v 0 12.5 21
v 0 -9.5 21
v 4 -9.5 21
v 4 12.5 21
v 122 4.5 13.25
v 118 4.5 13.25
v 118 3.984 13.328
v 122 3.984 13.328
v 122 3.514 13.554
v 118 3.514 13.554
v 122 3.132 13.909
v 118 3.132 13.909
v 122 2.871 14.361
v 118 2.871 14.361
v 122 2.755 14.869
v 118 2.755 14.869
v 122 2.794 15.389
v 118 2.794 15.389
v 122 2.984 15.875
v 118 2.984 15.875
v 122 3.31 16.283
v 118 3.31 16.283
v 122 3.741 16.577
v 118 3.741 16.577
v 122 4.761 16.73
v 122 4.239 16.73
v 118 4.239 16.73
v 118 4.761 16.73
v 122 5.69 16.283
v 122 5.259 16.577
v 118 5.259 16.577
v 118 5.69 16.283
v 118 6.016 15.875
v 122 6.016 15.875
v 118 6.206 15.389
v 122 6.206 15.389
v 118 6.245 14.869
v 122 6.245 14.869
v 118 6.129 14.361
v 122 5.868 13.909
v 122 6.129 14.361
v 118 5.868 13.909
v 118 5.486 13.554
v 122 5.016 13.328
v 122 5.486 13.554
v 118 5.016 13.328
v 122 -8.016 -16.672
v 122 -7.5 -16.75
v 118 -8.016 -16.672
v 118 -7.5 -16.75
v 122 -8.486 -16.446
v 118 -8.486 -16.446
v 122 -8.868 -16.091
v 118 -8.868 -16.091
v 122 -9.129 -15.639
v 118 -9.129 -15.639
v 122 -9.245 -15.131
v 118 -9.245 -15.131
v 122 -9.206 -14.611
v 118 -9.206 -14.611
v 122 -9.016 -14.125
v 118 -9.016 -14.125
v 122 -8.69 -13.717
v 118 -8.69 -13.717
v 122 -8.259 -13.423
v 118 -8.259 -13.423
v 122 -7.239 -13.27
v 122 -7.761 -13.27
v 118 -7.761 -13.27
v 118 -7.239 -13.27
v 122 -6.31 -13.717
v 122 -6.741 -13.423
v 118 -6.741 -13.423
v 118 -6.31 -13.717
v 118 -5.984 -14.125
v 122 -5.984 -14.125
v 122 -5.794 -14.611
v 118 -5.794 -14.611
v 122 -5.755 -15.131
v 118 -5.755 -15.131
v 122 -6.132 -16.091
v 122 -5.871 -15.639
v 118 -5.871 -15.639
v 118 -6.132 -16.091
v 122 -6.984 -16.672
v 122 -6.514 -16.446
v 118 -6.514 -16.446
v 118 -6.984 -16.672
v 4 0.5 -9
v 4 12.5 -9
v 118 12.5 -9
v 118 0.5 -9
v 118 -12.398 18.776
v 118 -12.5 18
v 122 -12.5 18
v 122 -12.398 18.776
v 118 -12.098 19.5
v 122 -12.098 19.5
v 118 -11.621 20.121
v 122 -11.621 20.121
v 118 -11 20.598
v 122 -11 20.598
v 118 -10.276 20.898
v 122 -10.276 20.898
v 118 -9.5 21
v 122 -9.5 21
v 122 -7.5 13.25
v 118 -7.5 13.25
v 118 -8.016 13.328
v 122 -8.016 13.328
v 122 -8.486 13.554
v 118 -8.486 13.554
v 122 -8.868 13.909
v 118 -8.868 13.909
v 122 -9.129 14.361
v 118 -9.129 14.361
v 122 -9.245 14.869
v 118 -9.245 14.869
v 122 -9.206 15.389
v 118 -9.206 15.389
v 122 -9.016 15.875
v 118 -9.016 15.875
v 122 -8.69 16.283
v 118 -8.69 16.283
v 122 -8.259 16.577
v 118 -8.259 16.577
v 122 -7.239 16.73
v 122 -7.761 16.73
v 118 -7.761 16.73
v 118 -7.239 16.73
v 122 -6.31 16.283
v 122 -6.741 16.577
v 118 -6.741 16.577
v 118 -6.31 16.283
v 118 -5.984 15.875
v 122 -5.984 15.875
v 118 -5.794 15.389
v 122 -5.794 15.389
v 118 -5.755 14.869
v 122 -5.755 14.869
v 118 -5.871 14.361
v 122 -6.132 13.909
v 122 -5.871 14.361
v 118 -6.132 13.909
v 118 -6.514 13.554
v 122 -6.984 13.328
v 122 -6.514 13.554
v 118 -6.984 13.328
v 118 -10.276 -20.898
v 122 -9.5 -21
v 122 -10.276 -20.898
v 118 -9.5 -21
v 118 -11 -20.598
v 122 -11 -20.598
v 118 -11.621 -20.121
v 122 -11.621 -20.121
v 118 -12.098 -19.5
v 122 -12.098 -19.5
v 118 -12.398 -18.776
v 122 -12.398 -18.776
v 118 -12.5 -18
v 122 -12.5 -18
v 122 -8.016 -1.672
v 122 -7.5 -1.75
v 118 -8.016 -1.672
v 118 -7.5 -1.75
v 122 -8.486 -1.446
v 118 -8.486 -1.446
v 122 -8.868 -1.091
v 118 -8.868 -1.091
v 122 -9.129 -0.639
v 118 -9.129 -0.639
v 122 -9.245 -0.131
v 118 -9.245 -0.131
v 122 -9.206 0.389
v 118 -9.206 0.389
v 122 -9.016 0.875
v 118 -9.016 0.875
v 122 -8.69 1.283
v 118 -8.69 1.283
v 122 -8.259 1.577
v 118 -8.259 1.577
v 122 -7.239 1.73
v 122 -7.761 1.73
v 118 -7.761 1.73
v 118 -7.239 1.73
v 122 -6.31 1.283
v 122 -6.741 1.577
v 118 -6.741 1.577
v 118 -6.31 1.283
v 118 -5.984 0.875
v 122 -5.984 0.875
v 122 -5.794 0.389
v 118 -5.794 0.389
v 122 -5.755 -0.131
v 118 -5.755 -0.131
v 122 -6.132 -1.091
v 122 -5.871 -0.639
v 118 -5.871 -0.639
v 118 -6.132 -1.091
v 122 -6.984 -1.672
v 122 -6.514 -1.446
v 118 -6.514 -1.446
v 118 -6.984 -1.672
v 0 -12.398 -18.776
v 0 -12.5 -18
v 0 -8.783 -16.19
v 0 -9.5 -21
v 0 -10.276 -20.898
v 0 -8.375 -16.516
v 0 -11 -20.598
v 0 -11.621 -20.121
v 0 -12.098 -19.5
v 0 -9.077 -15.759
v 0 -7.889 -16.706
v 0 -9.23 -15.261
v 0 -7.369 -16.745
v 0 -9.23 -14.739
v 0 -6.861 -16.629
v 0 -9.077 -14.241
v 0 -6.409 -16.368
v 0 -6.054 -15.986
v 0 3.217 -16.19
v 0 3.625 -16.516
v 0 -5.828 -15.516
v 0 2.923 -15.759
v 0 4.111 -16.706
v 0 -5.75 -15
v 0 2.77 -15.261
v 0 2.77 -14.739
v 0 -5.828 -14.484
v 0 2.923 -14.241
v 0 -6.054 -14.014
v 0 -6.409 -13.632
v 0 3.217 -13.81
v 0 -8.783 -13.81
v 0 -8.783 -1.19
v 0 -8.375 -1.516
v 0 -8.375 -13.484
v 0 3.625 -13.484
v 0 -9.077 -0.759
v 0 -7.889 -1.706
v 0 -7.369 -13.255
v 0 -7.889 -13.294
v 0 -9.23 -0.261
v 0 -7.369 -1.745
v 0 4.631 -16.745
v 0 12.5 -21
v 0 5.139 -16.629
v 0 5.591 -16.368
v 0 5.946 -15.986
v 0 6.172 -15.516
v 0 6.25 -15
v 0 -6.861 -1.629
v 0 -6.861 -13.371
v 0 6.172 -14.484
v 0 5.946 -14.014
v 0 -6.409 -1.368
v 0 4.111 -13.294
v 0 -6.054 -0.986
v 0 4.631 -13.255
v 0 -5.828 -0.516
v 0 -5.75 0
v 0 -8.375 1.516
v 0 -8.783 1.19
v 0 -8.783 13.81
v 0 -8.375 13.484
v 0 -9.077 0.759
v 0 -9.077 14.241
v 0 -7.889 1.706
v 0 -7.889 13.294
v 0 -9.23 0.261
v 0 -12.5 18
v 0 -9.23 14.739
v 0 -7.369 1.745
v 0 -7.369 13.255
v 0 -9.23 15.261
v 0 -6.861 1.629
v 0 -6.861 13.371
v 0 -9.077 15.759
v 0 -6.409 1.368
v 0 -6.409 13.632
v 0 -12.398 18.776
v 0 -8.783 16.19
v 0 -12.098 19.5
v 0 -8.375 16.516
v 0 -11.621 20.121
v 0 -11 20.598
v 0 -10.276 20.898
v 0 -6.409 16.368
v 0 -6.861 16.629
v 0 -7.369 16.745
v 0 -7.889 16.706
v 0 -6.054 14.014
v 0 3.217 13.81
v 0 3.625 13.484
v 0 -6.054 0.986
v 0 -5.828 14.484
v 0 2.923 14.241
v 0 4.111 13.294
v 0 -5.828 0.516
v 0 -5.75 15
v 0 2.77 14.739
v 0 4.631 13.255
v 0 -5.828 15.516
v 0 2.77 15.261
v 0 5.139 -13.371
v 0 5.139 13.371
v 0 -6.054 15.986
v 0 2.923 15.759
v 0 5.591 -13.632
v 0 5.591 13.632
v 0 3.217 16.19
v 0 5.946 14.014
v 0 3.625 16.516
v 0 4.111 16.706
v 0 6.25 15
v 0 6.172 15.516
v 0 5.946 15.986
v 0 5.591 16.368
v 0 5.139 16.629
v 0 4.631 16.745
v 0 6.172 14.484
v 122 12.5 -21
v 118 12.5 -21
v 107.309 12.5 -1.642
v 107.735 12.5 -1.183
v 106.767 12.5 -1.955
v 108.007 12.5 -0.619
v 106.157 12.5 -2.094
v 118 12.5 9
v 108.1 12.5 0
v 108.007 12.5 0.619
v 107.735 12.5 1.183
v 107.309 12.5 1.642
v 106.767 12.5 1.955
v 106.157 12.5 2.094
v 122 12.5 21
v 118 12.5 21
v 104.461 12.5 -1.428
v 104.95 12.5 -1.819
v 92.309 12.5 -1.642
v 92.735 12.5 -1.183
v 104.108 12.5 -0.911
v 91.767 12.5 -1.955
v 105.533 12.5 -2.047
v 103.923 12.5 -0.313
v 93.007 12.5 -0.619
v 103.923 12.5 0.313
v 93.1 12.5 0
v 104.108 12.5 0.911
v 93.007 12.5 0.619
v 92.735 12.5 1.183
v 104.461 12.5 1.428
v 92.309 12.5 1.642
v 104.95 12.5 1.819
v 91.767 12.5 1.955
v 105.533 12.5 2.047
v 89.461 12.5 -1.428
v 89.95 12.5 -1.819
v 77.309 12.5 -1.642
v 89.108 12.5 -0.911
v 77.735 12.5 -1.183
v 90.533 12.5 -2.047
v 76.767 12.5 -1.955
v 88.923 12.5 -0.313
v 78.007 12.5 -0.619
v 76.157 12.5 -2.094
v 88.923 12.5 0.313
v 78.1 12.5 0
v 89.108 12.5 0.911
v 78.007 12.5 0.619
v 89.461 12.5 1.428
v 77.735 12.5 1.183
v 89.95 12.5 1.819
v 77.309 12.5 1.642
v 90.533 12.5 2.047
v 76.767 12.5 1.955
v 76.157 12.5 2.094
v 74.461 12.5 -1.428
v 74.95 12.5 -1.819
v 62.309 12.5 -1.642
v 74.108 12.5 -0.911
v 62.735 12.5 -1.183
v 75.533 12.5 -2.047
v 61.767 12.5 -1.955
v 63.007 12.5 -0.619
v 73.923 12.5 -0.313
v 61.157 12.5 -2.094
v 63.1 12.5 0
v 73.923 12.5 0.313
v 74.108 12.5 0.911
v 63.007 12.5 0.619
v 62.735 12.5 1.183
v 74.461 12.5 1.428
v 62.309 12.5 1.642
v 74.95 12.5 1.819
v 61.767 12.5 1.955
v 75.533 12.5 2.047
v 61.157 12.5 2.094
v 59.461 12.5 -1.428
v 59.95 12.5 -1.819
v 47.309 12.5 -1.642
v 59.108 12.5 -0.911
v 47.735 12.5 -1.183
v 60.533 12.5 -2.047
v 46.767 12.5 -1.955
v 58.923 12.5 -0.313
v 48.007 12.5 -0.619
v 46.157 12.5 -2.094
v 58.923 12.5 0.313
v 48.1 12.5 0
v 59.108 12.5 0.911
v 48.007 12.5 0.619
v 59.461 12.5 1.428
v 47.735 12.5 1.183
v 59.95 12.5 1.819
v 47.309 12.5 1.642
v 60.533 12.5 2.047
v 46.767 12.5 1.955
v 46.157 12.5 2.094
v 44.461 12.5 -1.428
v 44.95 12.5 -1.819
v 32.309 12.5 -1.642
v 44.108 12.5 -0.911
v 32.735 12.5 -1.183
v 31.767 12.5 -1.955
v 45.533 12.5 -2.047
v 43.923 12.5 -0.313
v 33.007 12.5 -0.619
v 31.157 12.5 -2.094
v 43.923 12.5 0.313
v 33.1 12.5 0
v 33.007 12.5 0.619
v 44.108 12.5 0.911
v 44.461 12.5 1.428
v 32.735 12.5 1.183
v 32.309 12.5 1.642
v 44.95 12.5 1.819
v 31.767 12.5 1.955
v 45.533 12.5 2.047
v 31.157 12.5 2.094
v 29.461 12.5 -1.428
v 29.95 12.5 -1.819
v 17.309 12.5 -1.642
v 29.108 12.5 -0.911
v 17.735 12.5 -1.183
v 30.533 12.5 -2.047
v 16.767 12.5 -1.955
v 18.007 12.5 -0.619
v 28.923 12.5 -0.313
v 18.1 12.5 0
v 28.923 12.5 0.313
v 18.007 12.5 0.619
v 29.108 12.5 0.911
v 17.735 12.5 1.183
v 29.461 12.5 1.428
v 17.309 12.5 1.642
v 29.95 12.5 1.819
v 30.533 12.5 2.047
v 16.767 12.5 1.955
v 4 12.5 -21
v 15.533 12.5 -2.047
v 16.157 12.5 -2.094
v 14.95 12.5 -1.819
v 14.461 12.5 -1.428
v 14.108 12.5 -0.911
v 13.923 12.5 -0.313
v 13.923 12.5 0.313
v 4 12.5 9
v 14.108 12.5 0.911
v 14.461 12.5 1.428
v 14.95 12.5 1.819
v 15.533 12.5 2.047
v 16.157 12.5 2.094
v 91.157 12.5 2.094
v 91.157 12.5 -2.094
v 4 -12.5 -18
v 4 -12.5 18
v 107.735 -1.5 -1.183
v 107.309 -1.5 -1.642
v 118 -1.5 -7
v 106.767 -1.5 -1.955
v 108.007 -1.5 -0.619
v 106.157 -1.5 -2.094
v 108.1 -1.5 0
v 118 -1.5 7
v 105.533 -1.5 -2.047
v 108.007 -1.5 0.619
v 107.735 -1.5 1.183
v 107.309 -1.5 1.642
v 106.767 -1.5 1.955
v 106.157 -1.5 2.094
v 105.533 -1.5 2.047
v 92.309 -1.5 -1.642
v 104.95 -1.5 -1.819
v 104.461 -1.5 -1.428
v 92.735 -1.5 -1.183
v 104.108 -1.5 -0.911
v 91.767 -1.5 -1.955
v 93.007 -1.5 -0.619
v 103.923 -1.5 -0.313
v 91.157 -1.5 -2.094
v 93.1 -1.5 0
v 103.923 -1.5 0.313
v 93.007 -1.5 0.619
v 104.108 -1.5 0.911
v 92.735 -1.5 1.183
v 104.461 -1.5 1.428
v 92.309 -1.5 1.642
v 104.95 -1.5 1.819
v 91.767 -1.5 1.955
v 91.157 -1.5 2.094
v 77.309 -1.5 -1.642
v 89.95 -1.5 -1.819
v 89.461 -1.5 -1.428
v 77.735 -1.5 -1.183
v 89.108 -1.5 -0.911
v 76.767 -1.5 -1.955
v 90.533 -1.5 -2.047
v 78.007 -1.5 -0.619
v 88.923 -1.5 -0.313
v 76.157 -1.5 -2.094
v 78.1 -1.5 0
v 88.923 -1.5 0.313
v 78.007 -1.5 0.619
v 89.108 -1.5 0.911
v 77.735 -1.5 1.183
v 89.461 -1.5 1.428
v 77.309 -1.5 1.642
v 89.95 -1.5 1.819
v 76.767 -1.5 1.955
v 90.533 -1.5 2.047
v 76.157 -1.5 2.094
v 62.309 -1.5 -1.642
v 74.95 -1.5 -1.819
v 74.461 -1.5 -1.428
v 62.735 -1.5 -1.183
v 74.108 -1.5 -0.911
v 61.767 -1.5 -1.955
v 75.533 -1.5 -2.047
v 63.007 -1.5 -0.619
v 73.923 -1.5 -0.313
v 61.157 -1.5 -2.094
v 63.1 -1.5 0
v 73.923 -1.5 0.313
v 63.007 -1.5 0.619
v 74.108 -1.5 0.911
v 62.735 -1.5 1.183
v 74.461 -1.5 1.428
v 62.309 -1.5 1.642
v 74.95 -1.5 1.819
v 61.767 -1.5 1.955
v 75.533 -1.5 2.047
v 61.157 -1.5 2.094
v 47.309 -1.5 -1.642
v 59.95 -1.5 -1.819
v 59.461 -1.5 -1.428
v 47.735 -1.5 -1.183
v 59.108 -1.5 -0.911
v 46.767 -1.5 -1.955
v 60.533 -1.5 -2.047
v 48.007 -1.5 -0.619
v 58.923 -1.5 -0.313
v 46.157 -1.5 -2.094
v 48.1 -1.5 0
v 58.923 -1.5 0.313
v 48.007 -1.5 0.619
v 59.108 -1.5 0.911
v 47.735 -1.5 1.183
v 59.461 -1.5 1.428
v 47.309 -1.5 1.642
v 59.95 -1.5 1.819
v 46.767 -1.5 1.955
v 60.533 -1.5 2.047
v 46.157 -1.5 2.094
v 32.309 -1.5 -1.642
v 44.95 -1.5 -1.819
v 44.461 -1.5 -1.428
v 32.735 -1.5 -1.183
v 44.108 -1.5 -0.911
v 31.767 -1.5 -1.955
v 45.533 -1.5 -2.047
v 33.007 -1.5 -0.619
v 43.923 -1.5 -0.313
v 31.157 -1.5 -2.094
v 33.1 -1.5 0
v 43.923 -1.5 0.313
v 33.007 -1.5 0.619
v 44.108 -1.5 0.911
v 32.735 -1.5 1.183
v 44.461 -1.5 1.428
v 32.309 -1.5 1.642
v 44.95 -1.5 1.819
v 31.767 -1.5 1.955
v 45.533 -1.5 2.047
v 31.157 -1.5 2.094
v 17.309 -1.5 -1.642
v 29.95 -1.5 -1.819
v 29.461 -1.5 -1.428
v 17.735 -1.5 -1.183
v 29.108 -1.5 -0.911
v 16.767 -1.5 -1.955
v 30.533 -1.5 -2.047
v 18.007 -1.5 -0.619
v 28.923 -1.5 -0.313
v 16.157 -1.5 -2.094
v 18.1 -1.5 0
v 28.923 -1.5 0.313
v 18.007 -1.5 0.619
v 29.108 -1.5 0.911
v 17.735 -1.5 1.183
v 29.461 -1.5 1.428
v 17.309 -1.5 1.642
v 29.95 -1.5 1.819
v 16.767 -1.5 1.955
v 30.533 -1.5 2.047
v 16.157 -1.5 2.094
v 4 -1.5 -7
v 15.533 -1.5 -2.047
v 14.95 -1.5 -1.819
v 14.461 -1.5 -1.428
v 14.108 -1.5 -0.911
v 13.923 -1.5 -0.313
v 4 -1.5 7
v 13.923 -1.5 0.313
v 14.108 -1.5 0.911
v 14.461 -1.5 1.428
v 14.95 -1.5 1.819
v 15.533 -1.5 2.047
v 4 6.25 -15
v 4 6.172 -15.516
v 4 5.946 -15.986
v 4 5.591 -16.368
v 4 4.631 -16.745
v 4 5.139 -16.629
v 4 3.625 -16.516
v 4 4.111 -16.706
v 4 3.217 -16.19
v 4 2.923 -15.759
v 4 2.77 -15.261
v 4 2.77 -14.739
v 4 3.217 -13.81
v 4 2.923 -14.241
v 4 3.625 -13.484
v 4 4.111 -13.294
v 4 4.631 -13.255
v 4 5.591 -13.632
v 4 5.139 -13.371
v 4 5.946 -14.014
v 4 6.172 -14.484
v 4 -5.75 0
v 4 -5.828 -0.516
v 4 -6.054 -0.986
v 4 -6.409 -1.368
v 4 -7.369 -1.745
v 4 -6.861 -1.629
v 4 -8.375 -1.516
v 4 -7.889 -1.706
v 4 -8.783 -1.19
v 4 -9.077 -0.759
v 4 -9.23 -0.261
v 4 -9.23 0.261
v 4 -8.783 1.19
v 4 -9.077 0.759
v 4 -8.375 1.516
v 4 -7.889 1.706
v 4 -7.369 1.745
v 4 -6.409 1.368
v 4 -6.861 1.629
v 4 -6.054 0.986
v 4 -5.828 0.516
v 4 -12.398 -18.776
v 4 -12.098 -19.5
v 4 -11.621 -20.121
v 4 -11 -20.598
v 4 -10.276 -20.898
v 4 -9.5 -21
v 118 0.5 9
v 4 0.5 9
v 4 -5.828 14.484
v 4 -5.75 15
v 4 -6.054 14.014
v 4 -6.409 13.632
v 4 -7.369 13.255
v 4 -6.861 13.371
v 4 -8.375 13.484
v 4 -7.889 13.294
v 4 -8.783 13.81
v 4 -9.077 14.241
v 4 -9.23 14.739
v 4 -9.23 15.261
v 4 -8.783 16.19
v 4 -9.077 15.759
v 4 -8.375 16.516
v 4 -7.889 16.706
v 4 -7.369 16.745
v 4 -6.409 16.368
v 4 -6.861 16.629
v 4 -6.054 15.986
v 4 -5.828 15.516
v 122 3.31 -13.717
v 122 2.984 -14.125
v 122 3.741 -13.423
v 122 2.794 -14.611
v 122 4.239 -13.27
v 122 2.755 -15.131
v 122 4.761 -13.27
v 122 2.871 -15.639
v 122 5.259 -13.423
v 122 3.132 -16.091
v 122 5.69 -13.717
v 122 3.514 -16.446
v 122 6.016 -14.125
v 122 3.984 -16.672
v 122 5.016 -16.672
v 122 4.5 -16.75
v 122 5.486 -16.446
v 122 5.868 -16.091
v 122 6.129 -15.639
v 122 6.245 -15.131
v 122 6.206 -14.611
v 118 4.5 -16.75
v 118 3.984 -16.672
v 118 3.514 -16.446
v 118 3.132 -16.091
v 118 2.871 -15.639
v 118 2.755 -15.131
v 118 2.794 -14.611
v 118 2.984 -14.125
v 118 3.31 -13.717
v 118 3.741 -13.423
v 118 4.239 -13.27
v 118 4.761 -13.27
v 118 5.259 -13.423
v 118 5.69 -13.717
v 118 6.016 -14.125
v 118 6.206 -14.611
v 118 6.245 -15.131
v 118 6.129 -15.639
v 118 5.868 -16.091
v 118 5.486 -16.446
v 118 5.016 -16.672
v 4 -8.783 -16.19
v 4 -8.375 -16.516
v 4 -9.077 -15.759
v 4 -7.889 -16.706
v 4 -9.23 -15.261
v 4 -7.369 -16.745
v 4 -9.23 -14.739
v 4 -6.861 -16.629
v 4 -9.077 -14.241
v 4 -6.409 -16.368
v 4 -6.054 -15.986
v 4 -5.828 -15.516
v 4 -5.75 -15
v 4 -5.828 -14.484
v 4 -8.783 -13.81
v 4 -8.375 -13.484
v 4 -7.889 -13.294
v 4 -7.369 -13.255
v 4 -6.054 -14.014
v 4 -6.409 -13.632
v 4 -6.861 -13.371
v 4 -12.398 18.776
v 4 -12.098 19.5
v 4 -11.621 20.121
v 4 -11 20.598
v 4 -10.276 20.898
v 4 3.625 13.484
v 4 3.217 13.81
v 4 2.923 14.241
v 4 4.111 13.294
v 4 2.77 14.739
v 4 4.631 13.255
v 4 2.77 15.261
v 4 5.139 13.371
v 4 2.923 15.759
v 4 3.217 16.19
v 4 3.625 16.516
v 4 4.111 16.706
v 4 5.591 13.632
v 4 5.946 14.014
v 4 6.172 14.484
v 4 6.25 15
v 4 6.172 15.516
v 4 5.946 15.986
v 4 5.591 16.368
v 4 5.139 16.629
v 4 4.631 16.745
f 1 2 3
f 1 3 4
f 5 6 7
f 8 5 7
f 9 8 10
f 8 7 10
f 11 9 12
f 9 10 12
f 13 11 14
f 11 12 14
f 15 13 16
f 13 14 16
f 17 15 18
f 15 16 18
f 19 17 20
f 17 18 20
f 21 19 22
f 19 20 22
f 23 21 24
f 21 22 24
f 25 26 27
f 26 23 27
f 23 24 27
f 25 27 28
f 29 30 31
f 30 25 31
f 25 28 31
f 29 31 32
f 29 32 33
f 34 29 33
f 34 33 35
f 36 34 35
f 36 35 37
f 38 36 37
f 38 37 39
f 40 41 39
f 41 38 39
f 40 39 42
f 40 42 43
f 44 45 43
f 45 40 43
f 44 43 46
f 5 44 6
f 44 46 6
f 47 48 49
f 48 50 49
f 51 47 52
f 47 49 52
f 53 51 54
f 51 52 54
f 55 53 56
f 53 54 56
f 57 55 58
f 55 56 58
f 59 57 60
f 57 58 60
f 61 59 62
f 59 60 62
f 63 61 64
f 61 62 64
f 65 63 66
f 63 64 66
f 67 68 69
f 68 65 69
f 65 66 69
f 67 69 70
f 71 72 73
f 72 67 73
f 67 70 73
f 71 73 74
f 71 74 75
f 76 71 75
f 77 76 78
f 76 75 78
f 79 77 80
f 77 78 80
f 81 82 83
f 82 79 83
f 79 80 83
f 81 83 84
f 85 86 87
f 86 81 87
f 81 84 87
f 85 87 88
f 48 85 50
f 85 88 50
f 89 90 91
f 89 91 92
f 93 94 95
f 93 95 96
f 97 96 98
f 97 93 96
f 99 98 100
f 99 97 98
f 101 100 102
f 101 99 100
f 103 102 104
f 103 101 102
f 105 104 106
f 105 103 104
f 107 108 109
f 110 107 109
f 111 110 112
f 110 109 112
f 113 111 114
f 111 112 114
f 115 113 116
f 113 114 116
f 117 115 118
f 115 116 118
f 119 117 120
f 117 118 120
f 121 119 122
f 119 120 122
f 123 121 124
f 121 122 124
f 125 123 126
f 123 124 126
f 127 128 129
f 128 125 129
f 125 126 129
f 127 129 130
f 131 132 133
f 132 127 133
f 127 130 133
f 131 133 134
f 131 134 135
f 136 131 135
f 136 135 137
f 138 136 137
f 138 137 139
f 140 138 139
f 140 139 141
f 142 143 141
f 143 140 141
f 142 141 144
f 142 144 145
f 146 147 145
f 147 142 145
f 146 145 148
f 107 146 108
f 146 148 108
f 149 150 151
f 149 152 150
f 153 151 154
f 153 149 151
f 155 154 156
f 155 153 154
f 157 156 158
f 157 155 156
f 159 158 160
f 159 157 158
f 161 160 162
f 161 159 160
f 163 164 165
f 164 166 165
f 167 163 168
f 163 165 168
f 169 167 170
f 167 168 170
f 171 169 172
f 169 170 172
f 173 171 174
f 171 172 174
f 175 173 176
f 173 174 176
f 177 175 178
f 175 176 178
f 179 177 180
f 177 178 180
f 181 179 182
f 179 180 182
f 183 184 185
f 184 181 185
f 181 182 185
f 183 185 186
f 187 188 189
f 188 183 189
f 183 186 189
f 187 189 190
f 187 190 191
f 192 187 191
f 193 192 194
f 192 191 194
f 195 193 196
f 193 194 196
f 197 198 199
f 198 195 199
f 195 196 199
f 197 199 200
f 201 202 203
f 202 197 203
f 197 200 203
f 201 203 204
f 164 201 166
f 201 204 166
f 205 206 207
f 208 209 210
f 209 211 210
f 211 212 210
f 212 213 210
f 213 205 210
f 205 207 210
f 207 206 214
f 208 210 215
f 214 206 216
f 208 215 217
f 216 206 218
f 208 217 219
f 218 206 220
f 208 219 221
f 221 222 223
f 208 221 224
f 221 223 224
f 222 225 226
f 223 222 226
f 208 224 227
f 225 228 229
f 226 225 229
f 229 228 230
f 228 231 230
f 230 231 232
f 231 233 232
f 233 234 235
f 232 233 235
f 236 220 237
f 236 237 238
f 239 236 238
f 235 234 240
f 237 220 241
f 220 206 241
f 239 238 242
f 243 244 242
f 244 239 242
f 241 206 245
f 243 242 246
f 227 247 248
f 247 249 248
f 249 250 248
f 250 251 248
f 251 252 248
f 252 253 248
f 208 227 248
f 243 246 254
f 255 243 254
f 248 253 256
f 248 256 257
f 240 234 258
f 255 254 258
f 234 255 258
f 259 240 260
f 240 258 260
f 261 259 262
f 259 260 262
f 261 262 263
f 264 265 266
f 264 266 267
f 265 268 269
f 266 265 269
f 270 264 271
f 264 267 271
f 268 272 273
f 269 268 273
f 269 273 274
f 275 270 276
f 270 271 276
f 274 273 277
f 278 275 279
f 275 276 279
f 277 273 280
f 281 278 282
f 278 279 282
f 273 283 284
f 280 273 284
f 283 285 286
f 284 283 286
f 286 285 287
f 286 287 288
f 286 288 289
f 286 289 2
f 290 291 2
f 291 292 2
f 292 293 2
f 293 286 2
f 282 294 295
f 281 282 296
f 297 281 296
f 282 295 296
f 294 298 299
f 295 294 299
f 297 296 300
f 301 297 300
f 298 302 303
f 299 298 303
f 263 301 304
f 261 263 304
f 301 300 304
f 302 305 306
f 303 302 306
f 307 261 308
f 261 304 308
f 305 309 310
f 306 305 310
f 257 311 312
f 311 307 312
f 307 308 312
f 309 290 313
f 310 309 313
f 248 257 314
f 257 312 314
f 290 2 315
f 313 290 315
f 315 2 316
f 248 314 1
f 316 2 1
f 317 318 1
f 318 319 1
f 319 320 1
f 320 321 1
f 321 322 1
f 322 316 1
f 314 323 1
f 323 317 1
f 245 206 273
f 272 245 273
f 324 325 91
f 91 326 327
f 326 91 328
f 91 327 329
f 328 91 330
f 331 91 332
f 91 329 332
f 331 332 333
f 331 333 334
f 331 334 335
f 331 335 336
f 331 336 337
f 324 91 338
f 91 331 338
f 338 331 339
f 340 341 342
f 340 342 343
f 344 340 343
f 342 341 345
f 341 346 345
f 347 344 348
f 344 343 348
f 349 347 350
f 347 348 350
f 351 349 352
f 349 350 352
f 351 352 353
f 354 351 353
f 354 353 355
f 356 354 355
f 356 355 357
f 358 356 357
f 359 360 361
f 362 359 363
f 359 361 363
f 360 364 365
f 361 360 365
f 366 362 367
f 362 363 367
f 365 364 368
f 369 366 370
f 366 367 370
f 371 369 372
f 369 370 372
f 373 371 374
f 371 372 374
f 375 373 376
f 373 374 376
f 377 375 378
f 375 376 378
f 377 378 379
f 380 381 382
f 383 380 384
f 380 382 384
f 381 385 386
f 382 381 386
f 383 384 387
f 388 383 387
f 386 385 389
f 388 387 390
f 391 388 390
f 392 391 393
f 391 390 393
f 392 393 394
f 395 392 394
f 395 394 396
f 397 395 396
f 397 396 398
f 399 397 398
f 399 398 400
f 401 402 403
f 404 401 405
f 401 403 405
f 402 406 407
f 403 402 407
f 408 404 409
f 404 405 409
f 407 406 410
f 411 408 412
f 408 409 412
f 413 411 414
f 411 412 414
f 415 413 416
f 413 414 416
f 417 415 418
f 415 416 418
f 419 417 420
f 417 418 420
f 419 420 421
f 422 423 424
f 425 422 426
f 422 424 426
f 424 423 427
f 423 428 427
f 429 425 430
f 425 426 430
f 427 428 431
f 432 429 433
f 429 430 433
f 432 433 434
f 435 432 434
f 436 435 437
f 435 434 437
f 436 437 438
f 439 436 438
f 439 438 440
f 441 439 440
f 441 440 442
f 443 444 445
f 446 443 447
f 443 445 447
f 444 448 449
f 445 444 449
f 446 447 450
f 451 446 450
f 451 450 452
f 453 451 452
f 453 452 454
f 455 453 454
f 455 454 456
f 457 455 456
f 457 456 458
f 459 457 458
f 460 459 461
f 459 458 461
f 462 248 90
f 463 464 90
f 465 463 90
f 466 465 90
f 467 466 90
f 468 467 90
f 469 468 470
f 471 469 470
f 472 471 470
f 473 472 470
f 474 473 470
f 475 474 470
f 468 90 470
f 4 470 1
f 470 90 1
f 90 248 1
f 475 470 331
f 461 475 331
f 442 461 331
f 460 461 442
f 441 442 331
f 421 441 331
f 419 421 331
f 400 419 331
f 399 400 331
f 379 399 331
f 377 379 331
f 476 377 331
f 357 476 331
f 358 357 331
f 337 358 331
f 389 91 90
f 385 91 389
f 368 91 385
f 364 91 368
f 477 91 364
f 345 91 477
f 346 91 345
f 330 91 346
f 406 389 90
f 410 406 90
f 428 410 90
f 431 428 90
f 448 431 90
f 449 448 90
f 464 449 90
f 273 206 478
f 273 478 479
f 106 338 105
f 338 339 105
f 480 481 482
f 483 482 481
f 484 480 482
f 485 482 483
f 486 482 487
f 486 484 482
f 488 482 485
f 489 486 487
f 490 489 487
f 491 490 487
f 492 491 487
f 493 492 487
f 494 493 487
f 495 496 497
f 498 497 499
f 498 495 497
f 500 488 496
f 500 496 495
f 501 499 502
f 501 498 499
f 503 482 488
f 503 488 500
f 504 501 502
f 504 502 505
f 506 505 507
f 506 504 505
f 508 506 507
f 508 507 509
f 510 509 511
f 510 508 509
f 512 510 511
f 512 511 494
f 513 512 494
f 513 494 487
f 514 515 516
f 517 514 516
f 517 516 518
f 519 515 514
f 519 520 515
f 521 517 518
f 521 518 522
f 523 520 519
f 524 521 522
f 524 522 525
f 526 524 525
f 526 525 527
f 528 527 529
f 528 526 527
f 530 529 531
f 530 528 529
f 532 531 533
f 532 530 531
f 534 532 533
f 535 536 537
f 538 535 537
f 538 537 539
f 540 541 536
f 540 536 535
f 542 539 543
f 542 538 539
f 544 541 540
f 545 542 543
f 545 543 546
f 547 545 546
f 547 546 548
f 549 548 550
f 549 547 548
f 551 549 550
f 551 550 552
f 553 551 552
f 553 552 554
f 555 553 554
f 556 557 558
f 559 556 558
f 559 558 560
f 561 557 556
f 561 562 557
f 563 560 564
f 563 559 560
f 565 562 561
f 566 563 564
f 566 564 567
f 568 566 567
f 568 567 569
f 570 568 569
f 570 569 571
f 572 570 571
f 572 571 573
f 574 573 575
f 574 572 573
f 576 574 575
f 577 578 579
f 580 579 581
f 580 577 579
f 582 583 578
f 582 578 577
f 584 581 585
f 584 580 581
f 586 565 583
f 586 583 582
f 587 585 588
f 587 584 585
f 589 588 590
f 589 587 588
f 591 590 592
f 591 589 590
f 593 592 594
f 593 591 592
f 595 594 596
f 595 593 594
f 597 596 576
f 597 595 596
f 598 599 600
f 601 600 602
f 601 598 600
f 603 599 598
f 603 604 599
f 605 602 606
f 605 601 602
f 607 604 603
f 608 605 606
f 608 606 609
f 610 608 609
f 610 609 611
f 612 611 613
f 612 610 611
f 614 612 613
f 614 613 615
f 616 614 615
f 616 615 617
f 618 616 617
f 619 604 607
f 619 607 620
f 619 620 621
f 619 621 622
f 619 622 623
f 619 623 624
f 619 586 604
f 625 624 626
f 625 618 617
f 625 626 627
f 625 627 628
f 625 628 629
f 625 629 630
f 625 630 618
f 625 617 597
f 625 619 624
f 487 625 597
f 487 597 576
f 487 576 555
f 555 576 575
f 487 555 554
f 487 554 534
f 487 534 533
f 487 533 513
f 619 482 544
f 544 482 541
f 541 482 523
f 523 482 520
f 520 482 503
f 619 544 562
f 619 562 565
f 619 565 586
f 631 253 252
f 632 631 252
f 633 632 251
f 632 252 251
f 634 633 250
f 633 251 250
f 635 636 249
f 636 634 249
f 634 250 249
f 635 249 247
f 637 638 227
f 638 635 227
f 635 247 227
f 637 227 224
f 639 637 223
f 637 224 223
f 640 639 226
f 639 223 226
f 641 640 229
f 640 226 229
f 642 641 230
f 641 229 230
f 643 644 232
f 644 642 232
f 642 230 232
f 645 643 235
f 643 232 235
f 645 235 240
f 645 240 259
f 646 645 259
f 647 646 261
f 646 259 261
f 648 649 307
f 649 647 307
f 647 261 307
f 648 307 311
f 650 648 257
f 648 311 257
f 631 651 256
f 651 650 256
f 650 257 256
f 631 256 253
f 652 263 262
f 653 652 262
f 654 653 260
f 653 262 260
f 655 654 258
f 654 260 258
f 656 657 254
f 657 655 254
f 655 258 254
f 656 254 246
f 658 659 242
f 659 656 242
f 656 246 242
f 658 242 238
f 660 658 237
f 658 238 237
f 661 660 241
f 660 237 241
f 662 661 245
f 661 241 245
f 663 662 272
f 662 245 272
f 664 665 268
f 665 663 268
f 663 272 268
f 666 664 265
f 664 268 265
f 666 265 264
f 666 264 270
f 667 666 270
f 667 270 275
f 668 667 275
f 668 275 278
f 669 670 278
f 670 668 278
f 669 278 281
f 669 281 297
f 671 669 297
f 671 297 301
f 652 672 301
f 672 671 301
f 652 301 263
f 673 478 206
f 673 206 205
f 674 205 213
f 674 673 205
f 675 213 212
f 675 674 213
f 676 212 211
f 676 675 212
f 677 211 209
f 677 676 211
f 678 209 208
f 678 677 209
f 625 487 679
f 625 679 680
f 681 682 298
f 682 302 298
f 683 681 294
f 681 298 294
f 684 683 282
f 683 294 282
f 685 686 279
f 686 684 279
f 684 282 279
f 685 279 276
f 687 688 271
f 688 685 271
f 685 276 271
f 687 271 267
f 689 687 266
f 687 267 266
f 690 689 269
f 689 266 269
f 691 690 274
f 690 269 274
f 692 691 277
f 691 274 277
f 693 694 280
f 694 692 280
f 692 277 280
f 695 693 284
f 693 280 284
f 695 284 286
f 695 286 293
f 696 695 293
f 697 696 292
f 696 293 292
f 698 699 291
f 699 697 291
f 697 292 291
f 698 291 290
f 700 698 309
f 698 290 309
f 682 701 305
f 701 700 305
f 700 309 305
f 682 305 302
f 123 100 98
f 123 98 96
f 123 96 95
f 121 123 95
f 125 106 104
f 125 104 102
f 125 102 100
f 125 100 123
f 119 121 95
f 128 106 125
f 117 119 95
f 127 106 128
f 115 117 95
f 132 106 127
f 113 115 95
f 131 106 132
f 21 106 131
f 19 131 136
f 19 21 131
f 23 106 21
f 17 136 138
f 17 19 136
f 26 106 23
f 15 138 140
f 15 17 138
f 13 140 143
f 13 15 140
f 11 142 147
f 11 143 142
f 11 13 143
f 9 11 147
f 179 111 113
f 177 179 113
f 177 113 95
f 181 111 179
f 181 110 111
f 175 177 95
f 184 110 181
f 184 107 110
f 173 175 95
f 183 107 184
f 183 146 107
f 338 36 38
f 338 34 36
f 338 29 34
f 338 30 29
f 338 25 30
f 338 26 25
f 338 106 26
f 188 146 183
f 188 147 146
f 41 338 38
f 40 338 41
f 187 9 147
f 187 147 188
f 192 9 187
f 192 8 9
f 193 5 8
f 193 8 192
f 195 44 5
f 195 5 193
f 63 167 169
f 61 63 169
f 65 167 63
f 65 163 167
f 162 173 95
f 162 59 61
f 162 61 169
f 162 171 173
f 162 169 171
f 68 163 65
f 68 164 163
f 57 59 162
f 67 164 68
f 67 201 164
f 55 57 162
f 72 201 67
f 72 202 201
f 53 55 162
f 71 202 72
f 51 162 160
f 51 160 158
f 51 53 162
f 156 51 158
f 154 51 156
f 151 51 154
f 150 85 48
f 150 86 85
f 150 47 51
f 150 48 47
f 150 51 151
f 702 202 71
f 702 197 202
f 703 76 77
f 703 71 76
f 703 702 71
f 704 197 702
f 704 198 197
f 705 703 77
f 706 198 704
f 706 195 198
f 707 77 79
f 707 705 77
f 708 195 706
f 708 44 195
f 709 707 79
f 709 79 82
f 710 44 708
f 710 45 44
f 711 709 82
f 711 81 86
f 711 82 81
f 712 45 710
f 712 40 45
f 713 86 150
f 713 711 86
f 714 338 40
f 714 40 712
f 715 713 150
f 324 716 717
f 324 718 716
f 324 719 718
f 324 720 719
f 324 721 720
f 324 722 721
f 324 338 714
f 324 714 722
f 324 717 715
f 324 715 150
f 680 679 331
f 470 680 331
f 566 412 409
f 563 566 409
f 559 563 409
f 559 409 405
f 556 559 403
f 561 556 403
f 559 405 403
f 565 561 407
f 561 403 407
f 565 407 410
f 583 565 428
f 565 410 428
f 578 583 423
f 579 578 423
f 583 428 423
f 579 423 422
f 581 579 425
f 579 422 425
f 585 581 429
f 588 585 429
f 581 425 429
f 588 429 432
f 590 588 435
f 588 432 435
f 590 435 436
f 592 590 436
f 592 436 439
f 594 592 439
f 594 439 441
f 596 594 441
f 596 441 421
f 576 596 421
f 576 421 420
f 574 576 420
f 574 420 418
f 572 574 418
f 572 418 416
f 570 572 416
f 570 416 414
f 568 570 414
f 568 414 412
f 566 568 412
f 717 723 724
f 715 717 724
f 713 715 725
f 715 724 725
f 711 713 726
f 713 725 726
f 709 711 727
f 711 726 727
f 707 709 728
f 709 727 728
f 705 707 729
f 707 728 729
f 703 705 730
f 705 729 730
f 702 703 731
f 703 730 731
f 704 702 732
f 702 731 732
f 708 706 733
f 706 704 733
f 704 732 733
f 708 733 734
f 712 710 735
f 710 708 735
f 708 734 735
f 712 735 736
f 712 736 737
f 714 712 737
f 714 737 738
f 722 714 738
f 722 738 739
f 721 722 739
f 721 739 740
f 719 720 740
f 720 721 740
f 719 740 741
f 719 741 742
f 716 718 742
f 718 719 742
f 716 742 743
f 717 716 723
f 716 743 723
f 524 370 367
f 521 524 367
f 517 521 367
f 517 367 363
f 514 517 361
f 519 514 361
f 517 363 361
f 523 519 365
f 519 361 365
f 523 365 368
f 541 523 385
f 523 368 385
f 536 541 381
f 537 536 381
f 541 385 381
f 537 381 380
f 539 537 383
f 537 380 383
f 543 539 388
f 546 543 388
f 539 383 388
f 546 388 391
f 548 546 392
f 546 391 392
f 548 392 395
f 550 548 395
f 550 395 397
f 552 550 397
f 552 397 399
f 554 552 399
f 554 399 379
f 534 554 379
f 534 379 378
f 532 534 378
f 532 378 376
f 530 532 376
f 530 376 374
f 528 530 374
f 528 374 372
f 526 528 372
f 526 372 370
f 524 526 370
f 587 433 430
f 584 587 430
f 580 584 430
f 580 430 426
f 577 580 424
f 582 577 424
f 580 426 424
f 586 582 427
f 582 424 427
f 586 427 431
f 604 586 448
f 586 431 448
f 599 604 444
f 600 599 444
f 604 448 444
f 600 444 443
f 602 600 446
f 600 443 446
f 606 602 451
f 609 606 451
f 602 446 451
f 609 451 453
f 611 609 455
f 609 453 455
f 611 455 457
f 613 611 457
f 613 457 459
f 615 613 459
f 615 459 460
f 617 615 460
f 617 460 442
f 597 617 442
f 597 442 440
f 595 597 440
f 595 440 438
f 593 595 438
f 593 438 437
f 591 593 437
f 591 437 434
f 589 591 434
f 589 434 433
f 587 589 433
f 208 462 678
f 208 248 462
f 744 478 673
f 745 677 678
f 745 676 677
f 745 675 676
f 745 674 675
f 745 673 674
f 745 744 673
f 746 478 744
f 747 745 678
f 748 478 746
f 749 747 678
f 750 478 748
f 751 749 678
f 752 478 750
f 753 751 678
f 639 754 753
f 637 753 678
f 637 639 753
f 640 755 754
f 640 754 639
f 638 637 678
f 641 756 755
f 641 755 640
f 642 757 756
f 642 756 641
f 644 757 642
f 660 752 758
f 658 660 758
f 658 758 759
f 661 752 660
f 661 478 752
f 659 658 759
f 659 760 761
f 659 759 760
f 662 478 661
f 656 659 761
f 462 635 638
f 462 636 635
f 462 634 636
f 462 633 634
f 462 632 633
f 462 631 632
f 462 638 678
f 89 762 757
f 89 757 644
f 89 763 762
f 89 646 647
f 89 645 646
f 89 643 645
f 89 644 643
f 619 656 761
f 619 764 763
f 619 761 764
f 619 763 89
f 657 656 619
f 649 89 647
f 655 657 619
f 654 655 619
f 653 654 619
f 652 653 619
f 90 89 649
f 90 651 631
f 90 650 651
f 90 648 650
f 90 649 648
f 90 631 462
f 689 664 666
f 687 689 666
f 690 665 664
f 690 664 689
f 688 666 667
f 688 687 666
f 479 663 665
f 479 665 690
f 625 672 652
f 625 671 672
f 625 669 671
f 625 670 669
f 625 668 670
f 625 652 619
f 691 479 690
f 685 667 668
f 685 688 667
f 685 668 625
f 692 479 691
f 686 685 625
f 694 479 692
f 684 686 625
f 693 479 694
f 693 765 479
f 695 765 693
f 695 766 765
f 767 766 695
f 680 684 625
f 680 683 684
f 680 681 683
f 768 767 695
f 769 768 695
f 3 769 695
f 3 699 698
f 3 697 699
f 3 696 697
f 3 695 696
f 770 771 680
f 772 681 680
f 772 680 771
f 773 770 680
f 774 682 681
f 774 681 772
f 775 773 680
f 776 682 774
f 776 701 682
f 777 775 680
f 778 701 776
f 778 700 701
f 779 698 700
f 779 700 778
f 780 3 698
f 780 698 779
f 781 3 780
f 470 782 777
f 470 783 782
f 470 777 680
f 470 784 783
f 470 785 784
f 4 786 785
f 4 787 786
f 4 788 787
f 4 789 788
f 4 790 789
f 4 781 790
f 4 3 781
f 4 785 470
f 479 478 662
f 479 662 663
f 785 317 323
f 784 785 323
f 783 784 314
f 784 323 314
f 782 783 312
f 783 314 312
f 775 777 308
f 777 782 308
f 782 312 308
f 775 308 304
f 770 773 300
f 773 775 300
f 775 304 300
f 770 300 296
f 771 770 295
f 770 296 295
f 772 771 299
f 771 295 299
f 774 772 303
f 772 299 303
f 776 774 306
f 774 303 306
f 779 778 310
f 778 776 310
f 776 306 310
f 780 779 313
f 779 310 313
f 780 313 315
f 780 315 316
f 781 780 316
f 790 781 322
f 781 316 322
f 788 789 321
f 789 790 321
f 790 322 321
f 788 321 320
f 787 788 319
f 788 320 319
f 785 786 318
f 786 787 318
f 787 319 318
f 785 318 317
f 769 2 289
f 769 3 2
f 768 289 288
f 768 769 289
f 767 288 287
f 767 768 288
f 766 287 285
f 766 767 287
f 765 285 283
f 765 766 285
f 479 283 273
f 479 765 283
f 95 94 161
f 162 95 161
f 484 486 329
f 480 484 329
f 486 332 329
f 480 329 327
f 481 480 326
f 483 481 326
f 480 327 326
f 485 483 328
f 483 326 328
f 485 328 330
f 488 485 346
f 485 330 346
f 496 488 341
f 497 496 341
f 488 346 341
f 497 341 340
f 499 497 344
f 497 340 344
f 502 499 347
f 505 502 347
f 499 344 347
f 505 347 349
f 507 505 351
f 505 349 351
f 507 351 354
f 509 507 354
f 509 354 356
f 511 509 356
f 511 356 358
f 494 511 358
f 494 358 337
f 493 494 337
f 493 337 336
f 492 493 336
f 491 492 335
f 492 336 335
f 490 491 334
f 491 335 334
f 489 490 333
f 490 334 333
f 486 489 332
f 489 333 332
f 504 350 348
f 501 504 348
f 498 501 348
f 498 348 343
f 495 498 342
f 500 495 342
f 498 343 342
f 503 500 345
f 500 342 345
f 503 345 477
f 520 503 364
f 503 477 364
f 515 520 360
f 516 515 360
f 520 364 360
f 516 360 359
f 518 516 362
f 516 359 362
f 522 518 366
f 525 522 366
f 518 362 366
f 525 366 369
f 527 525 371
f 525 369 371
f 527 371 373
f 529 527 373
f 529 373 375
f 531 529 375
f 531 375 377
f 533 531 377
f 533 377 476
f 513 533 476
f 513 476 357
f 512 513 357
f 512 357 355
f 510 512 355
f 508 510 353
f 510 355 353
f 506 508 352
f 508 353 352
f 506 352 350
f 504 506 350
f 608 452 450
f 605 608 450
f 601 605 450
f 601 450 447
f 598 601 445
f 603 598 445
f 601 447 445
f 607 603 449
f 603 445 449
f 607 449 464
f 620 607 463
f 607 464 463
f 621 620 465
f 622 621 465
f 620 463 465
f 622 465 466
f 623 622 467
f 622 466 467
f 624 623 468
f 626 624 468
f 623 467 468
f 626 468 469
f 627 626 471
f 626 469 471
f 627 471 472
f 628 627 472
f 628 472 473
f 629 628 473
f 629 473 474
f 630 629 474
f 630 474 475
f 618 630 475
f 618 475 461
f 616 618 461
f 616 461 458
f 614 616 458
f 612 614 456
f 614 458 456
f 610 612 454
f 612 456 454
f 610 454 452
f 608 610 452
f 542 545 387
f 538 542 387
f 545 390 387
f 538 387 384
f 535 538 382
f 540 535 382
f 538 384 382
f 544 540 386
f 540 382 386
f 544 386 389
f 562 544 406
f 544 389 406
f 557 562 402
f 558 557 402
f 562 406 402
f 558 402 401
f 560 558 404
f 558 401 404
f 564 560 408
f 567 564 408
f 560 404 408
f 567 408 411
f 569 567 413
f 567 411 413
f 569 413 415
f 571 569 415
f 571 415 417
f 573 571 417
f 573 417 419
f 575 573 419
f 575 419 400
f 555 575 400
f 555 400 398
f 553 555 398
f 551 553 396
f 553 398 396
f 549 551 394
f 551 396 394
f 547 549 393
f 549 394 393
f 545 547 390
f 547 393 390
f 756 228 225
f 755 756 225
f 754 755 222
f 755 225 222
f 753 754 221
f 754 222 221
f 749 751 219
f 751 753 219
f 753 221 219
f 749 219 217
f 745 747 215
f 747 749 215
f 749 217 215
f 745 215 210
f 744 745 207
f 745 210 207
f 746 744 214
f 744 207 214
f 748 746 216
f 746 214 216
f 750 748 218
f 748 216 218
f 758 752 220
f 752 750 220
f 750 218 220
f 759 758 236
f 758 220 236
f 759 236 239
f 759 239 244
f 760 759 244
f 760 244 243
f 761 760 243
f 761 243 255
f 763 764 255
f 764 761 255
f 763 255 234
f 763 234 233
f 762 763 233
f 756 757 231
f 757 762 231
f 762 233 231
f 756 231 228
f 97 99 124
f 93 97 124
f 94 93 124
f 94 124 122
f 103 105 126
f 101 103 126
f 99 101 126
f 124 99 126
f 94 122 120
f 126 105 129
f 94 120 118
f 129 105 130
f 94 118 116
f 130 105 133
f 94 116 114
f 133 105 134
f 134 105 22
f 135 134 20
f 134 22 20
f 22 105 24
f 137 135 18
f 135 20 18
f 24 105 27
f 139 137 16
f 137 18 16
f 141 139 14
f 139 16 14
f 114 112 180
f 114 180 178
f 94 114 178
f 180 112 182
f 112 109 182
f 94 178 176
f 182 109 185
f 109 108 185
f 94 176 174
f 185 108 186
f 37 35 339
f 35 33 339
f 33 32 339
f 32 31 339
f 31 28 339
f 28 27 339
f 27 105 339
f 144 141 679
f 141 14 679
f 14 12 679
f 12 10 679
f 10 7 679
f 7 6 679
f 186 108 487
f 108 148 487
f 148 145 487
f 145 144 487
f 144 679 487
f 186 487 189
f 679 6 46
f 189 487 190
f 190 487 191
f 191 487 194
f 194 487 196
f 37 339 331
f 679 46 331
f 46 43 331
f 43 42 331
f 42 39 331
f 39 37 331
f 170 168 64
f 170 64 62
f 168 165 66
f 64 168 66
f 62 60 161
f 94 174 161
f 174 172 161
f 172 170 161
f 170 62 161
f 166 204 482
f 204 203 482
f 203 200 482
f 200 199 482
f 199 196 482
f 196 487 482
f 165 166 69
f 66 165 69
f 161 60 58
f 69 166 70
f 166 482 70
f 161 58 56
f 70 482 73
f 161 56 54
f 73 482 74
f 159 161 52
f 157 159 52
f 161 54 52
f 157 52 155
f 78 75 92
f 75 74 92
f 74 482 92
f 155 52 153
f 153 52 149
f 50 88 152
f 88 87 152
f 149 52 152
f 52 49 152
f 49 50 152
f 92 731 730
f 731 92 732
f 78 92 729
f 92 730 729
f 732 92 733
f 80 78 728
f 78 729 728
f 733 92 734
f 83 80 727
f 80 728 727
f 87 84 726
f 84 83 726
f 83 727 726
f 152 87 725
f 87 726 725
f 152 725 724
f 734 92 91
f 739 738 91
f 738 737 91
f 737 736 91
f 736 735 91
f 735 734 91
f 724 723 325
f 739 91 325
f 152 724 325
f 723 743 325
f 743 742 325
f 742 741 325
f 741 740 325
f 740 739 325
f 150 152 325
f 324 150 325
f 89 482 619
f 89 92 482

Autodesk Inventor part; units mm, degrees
ref_plane "YZ Plane" through (0, 0, 0) normal (1, 0, 0) x (0, 1, 0)
ref_plane "XZ Plane" through (0, 0, 0) normal (0, 1, 0) x (-1, 0, 0)
ref_plane "XY Plane" through (0, 0, 0) normal (0, 0, 1) x (1, 0, 0)
sketch "草图1" plane through (0, 0, 0) normal (1, 0, 0) x (0, 1, 0)
  line L0 (-12.5, 21) -> (12.5, 21)
  line L1 (12.5, 21) -> (12.5, -21)
  line L2 (12.5, -21) -> (-12.5, -21)
  line L3 (-12.5, -21) -> (-12.5, 21)
  line L4 (-12.5, 21) -> (12.5, -21) construction
  line L5 (12.5, 21) -> (-12.5, -21) construction
  line L6 (-7.5, -15) -> (4.5, -15) construction
  line L7 (4.5, -15) -> (4.5, 15) construction
  line L8 (4.5, 15) -> (-7.5, 15) construction
  line L9 (-7.5, 15) -> (-7.5, -15) construction
  line L10 (-7.5, -15) -> (4.5, 15) construction
  line L11 (4.5, -15) -> (-7.5, 15) construction
  line L12 (18.2853, 0) -> (0, 0) construction
  circle A0 centre (4.5, -15) radius 1.75
  circle A1 centre (4.5, 15) radius 1.75
  circle A2 centre (-7.5, 15) radius 1.75
  circle A3 centre (-7.5, 0) radius 1.75
  circle A4 centre (-7.5, -15) radius 1.75
  point P0 (-1.5, 0)
  dimension "d0" = 42
  dimension "d1" = 25
  dimension "d4" = 8
  dimension "d5" = 20
  dimension "d6" = 30
  dimension "d7" = 3.5
  dimension "d8" = 3.5
  dimension "d9" = 3.5
  dimension "d10" = 3.5
  dimension "d11" = 3.5
extrude "拉伸1" add sketch "草图1" along normal blind 4
fillet "圆角1" radius 3 2 edges at (2, -12.5, -21) (2, -12.5, 21)
sketch "草图2" plane through (4, 0, 0) normal (1, 0, 0) x (0, 0, -1)
  line L0 (21, 12.5) -> (-21, 12.5) projected
  line L1 (9, -1.5) -> (-9, -1.5)
  line L2 (-9, -1.5) -> (-9, 12.5)
  line L3 (-9, 12.5) -> (9, 12.5)
  line L4 (9, 12.5) -> (9, -1.5)
  line L5 (9, -1.5) -> (-9, 12.5) construction
  line L6 (-9, -1.5) -> (9, 12.5) construction
  line L7 (0, -21.7484) -> (0, 21.3342) construction
  point P0 (0, 0)
  point P1 (0, 5.5)
  point P2 (9, 12.5)
  dimension "d15" = 18
  dimension "d16" = 14
extrude "拉伸2" add sketch "草图2" along normal blind 114
sketch "草图3" plane through (118, 0, 0) normal (1, 0, 0) x (0, 0, -1)
  arc A0 (-21, -9.5) -> (-18, -12.5) centre (-18, -9.5) ccw projected
  line L0 (-21, 12.5) -> (-21, -9.5) projected
  line L1 (21, 12.5) -> (-21, 12.5) projected
  line L2 (21, -9.5) -> (21, 12.5) projected
  arc A1 (18, -12.5) -> (21, -9.5) centre (18, -9.5) ccw projected
  line L3 (-18, -12.5) -> (18, -12.5) projected
  circle A2 centre (15, -7.5) radius 1.75 projected
  circle A3 centre (0, -7.5) radius 1.75 projected
  circle A4 centre (-15, -7.5) radius 1.75 projected
  circle A5 centre (-15, 4.5) radius 1.75 projected
  circle A6 centre (15, 4.5) radius 1.75 projected
  point P0 (0, 0)
extrude "拉伸3" add sketch "草图3" along normal blind 4
chamfer "倒角1" distance 2 angle 45 2 edges at (61, -1.5, -9) (61, -1.5, 9)
sketch "草图4" plane through (0, 12.5, 21) normal (0, 1, 0) x (1, 0, 0)
  line L0 (61, 0.1174) -> (61, 41.8826) construction
  line L1 (122, 42) -> (122, 0) projected
  line L2 (0, 42) -> (0, 0) projected
  circle A0 centre (61, 21) radius 2.1
  line L3 (122, 21) -> (0, 21) construction
  circle A1 centre (46, 21) radius 2.1
  circle A2 centre (31, 21) radius 2.1
  circle A3 centre (16, 21) radius 2.1
  circle A4 centre (76, 21) radius 2.1
  circle A5 centre (61, 21) radius 2.1
  circle A6 centre (46, 21) radius 2.1
  circle A7 centre (31, 21) radius 2.1
  circle A8 centre (91, 21) radius 2.1
  circle A9 centre (76, 21) radius 2.1
  circle A10 centre (61, 21) radius 2.1
  circle A11 centre (46, 21) radius 2.1
  circle A12 centre (106, 21) radius 2.1
  circle A13 centre (91, 21) radius 2.1
  circle A14 centre (76, 21) radius 2.1
  circle A15 centre (61, 21) radius 2.1
  dimension "d24" = 61
  dimension "d25" = 61
  dimension "d26" = 4.2
  dimension "d29" = 15
  dimension "d32" = 15
extrude "拉伸4" cut sketch "草图4" against normal through all
properties part number "加强梁"
